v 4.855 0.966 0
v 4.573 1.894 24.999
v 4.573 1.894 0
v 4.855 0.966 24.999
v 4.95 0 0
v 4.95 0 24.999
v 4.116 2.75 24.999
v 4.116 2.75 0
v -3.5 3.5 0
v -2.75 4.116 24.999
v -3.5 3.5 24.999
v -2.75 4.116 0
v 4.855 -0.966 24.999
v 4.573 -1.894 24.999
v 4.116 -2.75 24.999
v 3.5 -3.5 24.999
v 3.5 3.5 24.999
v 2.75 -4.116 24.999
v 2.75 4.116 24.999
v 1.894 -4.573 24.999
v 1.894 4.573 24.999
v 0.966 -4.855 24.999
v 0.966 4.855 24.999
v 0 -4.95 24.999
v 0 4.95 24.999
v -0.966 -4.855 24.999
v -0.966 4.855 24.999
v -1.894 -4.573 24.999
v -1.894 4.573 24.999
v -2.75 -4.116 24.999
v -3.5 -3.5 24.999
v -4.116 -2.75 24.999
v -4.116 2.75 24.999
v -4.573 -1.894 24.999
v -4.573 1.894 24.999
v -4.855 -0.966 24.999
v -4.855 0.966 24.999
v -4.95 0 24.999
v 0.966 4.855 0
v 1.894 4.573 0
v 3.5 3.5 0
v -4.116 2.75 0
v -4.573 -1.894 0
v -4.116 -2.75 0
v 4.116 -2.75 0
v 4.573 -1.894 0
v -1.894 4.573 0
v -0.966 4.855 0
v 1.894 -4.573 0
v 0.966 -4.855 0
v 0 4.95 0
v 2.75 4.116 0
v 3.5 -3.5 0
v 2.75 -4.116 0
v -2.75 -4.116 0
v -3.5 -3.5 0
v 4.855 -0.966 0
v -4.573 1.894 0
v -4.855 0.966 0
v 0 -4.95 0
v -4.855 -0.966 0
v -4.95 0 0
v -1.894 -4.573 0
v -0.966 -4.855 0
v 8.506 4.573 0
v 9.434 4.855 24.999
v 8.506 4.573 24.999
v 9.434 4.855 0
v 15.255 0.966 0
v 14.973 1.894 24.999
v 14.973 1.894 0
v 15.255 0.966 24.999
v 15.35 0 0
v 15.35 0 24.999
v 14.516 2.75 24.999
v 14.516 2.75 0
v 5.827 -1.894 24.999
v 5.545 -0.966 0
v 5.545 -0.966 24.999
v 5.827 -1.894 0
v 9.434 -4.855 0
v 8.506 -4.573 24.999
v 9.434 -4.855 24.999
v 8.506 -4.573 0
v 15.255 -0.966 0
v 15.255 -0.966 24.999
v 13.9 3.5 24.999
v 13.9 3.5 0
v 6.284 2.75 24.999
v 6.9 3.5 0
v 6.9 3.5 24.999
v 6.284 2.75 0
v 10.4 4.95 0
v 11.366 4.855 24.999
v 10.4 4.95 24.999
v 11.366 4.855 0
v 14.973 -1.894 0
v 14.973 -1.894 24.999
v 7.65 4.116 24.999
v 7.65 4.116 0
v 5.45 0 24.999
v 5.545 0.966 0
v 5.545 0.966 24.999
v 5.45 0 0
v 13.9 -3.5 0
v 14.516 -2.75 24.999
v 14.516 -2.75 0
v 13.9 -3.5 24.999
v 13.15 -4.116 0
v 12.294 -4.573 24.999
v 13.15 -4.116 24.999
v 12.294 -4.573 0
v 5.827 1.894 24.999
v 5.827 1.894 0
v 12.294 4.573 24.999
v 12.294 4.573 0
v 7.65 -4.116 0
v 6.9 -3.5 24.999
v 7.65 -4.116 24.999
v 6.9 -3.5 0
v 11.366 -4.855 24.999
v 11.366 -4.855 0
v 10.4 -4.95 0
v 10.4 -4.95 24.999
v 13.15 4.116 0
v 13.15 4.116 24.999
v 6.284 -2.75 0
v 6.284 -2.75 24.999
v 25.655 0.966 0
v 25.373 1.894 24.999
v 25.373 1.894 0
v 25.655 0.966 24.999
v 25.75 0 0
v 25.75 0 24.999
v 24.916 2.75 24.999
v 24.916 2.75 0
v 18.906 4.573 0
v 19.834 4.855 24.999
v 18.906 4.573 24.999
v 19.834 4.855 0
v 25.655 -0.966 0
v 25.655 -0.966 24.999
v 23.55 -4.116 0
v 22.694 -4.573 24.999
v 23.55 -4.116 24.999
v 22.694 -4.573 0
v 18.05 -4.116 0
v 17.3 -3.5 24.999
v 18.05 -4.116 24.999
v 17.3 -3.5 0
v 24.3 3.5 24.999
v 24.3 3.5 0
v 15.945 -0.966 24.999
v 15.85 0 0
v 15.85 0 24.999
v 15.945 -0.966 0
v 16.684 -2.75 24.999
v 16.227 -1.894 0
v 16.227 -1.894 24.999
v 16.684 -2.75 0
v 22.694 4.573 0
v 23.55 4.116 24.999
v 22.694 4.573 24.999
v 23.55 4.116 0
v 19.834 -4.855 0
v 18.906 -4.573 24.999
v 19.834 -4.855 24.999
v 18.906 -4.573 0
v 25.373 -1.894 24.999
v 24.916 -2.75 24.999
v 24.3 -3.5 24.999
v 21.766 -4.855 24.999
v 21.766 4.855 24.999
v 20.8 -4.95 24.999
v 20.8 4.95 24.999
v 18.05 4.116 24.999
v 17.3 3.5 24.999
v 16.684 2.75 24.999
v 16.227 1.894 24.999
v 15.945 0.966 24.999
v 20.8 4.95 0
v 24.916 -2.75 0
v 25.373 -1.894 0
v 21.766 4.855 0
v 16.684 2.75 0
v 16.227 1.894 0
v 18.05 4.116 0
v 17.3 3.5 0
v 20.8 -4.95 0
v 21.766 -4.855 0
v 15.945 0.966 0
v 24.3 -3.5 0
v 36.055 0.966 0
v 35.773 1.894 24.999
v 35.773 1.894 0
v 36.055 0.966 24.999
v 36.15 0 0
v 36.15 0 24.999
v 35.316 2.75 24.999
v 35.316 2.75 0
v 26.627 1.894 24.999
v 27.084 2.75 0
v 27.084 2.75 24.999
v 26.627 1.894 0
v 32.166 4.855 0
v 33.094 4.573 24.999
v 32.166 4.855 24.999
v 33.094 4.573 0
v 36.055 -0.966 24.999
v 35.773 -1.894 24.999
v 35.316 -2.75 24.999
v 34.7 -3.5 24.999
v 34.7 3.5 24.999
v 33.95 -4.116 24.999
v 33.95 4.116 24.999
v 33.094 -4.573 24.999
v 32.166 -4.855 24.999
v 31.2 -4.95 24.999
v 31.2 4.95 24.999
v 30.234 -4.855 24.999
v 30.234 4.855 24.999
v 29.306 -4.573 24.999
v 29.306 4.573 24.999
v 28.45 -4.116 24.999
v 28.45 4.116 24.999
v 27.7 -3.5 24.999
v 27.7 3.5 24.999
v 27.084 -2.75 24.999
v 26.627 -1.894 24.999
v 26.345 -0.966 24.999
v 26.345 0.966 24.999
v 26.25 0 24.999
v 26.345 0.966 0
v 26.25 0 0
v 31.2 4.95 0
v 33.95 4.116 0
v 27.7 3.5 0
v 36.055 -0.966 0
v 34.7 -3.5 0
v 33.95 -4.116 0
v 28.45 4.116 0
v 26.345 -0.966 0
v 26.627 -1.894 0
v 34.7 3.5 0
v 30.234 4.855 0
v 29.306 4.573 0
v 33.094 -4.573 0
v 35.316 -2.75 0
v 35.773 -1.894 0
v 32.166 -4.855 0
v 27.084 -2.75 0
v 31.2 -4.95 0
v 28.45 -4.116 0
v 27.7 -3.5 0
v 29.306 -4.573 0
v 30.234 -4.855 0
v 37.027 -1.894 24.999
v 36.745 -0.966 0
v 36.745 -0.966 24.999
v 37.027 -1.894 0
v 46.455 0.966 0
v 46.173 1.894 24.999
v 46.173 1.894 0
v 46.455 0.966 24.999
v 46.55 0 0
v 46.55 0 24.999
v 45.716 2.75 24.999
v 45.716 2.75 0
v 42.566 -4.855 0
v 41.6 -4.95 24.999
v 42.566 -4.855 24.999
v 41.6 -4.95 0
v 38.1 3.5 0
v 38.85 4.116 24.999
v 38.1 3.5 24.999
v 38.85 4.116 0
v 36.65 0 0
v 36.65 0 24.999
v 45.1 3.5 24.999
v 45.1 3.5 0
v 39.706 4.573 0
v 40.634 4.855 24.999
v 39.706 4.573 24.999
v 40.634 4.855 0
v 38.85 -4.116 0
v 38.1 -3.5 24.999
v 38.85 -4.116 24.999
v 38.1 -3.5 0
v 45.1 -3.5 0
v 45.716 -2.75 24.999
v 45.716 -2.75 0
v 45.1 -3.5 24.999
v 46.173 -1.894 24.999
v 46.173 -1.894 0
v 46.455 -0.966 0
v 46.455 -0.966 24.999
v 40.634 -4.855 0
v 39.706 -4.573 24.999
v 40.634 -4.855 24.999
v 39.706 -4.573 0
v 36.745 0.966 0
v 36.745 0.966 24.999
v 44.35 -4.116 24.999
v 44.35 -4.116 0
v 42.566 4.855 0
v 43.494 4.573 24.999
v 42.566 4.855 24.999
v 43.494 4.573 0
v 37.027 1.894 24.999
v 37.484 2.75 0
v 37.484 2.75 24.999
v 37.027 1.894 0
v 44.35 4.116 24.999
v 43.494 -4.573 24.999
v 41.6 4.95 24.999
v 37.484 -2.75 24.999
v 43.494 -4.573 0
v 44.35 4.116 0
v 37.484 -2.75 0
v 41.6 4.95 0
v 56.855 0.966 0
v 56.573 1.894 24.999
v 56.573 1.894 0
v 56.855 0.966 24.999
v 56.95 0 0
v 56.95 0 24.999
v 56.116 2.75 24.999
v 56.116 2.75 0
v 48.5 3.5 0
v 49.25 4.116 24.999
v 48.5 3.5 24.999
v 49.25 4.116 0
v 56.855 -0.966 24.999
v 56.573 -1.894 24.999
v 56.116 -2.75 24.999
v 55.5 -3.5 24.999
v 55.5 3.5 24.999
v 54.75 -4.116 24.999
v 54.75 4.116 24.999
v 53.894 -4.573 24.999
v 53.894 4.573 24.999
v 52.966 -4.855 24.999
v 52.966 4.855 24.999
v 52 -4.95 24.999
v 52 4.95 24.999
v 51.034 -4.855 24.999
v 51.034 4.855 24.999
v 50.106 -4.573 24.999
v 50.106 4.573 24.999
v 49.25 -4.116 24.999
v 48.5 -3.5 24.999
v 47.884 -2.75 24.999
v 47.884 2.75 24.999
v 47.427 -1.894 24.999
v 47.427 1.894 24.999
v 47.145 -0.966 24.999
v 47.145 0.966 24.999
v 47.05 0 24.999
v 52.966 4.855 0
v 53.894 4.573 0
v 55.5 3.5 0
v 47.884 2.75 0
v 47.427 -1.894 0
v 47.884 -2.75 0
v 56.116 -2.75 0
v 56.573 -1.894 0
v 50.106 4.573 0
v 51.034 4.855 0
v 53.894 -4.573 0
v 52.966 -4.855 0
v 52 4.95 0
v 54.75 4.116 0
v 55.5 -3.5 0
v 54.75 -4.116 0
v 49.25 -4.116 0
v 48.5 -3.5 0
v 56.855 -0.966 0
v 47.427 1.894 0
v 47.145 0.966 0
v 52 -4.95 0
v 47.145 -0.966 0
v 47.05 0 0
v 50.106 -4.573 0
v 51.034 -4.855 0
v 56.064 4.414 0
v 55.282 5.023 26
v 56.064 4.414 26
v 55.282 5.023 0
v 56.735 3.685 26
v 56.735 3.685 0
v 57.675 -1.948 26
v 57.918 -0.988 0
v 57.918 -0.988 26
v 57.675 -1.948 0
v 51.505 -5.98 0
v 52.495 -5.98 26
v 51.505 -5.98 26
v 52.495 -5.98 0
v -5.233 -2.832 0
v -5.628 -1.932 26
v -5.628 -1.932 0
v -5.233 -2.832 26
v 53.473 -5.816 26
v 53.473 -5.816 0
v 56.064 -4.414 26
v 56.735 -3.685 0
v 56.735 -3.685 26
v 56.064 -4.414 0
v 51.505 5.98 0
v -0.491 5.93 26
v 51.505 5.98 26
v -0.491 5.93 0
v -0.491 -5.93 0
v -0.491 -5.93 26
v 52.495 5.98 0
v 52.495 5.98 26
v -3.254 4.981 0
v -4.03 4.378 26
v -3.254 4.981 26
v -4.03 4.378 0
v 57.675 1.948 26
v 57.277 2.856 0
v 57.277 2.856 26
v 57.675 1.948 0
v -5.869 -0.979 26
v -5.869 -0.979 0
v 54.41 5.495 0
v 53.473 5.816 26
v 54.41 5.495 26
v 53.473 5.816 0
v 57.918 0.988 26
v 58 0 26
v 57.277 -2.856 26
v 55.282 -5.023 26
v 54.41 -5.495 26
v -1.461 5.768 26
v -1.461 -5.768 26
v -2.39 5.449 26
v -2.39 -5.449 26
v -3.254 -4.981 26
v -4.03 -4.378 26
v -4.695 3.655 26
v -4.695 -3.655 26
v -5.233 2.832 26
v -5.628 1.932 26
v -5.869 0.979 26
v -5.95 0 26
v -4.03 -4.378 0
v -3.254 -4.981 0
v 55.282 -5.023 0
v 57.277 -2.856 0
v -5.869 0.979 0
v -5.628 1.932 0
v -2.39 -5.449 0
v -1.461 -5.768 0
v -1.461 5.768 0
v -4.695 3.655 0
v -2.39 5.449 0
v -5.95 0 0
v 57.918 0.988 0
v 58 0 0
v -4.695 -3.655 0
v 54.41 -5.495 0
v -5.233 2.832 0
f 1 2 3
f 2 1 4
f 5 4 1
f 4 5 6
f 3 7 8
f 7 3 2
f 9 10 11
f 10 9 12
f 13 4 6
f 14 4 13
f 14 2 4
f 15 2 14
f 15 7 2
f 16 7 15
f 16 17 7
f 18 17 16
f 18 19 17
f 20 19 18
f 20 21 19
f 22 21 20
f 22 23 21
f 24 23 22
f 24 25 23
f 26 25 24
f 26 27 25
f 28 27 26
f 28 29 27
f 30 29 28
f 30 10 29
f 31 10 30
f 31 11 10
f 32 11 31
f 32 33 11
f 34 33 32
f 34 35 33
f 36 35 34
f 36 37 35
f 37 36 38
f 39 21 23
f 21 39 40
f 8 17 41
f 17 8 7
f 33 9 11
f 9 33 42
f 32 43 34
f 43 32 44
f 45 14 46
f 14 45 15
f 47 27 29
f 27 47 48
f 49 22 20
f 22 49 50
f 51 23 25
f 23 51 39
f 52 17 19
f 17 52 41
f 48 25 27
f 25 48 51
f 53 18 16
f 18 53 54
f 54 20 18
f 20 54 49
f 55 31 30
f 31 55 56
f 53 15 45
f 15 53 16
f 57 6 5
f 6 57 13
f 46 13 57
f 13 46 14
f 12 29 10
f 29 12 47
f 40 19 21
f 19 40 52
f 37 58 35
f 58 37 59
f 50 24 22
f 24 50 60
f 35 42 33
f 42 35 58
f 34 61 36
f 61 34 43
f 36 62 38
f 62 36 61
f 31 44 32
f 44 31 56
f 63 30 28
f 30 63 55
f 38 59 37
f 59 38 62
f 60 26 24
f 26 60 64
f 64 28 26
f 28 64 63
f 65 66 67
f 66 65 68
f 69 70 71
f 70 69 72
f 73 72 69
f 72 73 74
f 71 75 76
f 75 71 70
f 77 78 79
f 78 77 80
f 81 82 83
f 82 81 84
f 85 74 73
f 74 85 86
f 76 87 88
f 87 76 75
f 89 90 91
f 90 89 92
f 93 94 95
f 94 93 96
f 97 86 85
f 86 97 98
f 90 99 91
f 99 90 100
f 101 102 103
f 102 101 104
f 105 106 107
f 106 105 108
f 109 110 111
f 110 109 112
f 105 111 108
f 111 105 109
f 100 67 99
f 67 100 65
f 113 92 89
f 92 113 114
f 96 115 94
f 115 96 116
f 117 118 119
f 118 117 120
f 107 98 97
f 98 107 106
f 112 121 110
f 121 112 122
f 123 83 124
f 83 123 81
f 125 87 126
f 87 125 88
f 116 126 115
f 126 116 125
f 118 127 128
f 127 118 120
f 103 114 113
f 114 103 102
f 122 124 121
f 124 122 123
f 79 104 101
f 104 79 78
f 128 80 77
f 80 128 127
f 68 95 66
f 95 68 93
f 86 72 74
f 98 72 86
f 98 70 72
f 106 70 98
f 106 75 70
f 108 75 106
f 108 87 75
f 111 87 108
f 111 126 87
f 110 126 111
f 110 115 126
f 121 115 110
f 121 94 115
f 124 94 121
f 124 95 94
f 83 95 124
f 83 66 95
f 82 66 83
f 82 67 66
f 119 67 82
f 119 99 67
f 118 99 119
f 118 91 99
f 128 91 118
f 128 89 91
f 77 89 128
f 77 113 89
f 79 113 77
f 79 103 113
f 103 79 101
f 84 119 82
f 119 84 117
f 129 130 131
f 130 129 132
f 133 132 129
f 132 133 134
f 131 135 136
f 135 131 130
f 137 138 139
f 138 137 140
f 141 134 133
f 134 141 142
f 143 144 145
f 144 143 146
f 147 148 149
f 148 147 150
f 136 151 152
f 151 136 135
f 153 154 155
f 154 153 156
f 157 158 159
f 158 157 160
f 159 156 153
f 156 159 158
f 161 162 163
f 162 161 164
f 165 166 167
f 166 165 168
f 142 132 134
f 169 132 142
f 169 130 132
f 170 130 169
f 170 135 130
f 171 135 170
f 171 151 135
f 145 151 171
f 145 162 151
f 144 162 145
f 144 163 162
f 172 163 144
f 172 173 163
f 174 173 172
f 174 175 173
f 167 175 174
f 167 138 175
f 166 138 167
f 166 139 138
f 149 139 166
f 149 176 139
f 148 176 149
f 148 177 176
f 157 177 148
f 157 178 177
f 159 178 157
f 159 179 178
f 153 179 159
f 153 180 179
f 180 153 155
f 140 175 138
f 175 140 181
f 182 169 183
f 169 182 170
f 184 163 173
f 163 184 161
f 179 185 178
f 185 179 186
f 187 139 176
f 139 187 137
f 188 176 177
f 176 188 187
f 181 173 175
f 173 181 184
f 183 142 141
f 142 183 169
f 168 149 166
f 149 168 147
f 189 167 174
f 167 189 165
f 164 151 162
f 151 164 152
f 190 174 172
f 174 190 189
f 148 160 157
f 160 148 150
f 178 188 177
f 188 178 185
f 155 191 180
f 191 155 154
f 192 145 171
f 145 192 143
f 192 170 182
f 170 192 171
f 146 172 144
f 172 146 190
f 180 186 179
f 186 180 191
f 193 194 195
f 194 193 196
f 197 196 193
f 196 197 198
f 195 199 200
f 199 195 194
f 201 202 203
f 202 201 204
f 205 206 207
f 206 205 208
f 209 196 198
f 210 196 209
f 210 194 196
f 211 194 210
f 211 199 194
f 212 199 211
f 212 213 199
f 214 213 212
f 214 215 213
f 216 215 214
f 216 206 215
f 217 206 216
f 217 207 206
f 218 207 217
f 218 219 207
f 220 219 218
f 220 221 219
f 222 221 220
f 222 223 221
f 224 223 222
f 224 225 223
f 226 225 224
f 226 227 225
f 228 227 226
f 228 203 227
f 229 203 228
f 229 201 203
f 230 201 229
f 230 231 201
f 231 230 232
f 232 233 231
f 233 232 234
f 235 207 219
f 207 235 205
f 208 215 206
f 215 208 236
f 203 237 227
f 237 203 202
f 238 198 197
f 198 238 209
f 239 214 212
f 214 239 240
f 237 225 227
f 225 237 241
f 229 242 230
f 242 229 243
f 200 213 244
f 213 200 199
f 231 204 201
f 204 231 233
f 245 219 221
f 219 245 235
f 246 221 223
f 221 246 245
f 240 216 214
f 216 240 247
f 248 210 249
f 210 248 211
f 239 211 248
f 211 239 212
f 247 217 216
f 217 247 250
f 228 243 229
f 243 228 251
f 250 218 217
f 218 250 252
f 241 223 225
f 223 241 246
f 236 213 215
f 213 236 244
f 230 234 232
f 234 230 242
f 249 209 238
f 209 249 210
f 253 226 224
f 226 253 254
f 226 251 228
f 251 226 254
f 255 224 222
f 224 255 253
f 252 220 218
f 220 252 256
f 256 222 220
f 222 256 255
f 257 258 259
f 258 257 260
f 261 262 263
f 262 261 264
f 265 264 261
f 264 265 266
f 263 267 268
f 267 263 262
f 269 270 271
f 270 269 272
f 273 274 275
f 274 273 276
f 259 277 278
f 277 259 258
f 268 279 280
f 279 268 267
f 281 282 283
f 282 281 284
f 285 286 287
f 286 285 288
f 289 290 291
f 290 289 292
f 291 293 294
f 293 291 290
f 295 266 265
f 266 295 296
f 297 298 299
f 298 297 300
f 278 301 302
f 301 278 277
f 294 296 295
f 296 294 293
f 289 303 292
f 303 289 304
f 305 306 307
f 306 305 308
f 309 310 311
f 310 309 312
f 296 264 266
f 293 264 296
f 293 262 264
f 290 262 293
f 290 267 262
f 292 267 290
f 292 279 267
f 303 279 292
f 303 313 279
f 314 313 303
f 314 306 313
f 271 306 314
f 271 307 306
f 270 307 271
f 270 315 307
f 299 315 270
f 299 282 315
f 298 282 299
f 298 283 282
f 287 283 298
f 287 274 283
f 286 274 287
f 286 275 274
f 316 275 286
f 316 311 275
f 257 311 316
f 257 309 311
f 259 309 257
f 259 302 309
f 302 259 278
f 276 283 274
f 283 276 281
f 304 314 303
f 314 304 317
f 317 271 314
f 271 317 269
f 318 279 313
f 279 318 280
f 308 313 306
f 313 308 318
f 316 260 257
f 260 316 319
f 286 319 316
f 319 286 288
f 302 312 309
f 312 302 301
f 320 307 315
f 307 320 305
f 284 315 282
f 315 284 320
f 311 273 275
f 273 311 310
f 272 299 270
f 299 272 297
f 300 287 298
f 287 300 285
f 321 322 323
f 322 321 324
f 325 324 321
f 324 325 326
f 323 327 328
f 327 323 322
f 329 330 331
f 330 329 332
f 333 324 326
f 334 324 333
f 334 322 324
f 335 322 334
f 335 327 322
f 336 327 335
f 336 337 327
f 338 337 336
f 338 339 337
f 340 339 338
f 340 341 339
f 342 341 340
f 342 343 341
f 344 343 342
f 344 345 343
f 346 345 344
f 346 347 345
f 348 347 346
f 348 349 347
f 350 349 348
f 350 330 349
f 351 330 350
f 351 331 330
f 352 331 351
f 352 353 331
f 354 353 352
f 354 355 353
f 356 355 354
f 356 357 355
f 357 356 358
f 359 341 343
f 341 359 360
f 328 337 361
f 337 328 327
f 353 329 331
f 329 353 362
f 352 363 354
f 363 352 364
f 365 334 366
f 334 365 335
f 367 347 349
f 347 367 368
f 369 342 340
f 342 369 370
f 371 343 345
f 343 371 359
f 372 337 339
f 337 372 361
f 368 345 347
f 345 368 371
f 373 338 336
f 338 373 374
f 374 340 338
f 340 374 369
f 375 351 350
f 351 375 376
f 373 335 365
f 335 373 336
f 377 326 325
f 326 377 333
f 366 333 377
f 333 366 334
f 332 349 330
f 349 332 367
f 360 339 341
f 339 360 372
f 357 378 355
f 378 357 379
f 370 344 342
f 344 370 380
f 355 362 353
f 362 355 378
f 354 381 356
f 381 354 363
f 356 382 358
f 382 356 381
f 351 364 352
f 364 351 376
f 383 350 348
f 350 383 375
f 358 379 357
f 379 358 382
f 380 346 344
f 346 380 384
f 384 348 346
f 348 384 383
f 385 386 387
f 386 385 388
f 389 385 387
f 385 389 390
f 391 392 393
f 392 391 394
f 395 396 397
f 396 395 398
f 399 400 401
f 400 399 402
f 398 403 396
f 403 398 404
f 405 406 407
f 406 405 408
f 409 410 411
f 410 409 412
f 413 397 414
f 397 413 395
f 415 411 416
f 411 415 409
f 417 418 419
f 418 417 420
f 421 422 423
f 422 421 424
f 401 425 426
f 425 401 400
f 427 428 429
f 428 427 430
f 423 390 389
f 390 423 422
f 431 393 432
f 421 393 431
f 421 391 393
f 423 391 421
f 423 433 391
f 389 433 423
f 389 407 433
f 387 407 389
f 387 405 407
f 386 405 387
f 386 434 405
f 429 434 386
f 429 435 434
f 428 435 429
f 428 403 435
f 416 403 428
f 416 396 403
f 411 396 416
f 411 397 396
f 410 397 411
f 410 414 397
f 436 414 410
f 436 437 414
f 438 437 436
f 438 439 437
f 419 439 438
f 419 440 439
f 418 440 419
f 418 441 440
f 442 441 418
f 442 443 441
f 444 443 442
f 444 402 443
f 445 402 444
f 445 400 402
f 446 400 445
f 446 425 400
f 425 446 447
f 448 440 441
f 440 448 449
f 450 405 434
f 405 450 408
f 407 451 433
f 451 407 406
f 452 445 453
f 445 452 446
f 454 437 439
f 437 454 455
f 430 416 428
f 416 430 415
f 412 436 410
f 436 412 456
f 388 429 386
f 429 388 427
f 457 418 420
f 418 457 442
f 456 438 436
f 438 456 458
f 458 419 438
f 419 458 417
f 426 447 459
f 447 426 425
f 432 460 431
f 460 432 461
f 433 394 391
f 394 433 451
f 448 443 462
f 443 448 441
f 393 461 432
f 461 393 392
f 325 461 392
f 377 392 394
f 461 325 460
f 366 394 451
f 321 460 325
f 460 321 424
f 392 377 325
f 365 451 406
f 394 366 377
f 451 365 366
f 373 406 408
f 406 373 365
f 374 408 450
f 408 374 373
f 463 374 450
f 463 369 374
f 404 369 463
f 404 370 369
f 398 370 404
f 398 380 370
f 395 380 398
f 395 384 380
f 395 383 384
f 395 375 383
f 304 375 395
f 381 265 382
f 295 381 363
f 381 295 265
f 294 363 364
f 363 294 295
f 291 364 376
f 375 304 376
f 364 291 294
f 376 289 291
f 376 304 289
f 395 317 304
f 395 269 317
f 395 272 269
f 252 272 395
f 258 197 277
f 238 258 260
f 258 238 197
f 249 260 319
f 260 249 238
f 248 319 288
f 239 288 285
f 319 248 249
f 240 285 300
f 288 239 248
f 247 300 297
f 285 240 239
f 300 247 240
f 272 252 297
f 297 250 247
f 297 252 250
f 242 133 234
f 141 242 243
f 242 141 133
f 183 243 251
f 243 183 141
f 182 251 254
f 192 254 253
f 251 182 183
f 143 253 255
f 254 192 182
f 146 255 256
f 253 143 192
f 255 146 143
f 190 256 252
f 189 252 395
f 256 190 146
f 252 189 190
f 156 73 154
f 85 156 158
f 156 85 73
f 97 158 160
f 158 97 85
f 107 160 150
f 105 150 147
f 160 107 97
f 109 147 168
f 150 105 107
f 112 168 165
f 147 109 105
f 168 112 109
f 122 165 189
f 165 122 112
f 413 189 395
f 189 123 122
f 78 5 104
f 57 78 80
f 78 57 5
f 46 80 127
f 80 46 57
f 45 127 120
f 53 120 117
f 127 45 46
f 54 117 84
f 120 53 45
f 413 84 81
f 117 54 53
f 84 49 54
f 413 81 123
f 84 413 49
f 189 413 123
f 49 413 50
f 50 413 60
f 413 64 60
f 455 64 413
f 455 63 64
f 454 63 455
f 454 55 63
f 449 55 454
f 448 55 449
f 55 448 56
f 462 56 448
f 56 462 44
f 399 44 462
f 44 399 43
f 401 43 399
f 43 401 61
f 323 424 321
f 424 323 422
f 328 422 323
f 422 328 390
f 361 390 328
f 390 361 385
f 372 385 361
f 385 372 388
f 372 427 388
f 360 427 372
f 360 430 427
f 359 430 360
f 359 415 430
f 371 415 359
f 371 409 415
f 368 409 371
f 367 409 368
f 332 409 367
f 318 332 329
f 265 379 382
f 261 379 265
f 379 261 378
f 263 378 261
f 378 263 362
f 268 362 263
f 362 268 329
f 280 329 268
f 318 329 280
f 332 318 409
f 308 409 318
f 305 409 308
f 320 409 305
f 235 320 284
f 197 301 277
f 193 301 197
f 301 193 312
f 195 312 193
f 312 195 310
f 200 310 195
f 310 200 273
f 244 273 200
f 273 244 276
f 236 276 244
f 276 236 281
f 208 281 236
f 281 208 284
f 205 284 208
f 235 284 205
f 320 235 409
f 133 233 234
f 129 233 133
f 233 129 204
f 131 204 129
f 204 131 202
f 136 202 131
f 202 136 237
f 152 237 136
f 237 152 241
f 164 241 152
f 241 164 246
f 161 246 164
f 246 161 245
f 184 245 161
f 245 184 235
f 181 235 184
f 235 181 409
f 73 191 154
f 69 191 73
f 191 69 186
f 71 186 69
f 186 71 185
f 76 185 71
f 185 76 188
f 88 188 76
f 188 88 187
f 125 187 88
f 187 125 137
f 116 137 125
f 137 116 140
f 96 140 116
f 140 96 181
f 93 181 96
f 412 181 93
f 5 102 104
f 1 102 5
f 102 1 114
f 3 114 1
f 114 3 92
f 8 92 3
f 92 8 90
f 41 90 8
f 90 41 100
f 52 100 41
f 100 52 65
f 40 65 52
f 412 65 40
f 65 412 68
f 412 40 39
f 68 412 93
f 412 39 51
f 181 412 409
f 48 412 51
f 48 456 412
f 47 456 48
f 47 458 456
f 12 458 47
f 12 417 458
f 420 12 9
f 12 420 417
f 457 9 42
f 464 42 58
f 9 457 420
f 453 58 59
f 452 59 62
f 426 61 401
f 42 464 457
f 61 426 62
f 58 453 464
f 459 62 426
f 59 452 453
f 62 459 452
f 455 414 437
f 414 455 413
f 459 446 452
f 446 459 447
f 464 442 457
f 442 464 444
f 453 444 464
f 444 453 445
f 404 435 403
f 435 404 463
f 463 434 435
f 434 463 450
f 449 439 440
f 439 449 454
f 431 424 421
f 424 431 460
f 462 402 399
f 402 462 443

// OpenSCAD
$fs = 1;
$fa = 5;

pencilSize = 4.9*2;
pencilSpacing = pencilSize + 0.6;
numPencils = 6;
capHeight = 25;

wallThickness = 1;

module pencil_spacing() {
	cylinder(d = pencilSize + 0.1, h = capHeight);
}

module pencil_spacing_array() {
	for(i=[0 : numPencils - 1]) translate([pencilSpacing*i, 0, 0]) pencil_spacing();
}

module pencil_hull() {
	hull() {
		cylinder(d = pencilSize + 0.1 + wallThickness * 2, h = capHeight + wallThickness);
		translate([pencilSpacing * (numPencils - 1), 0, 0]) 		cylinder(d = pencilSize + 0.2 + wallThickness * 2, h = capHeight + wallThickness);
	}
}

difference() {
	pencil_hull();
	translate([0, 0, -0.001]) pencil_spacing_array();
}
